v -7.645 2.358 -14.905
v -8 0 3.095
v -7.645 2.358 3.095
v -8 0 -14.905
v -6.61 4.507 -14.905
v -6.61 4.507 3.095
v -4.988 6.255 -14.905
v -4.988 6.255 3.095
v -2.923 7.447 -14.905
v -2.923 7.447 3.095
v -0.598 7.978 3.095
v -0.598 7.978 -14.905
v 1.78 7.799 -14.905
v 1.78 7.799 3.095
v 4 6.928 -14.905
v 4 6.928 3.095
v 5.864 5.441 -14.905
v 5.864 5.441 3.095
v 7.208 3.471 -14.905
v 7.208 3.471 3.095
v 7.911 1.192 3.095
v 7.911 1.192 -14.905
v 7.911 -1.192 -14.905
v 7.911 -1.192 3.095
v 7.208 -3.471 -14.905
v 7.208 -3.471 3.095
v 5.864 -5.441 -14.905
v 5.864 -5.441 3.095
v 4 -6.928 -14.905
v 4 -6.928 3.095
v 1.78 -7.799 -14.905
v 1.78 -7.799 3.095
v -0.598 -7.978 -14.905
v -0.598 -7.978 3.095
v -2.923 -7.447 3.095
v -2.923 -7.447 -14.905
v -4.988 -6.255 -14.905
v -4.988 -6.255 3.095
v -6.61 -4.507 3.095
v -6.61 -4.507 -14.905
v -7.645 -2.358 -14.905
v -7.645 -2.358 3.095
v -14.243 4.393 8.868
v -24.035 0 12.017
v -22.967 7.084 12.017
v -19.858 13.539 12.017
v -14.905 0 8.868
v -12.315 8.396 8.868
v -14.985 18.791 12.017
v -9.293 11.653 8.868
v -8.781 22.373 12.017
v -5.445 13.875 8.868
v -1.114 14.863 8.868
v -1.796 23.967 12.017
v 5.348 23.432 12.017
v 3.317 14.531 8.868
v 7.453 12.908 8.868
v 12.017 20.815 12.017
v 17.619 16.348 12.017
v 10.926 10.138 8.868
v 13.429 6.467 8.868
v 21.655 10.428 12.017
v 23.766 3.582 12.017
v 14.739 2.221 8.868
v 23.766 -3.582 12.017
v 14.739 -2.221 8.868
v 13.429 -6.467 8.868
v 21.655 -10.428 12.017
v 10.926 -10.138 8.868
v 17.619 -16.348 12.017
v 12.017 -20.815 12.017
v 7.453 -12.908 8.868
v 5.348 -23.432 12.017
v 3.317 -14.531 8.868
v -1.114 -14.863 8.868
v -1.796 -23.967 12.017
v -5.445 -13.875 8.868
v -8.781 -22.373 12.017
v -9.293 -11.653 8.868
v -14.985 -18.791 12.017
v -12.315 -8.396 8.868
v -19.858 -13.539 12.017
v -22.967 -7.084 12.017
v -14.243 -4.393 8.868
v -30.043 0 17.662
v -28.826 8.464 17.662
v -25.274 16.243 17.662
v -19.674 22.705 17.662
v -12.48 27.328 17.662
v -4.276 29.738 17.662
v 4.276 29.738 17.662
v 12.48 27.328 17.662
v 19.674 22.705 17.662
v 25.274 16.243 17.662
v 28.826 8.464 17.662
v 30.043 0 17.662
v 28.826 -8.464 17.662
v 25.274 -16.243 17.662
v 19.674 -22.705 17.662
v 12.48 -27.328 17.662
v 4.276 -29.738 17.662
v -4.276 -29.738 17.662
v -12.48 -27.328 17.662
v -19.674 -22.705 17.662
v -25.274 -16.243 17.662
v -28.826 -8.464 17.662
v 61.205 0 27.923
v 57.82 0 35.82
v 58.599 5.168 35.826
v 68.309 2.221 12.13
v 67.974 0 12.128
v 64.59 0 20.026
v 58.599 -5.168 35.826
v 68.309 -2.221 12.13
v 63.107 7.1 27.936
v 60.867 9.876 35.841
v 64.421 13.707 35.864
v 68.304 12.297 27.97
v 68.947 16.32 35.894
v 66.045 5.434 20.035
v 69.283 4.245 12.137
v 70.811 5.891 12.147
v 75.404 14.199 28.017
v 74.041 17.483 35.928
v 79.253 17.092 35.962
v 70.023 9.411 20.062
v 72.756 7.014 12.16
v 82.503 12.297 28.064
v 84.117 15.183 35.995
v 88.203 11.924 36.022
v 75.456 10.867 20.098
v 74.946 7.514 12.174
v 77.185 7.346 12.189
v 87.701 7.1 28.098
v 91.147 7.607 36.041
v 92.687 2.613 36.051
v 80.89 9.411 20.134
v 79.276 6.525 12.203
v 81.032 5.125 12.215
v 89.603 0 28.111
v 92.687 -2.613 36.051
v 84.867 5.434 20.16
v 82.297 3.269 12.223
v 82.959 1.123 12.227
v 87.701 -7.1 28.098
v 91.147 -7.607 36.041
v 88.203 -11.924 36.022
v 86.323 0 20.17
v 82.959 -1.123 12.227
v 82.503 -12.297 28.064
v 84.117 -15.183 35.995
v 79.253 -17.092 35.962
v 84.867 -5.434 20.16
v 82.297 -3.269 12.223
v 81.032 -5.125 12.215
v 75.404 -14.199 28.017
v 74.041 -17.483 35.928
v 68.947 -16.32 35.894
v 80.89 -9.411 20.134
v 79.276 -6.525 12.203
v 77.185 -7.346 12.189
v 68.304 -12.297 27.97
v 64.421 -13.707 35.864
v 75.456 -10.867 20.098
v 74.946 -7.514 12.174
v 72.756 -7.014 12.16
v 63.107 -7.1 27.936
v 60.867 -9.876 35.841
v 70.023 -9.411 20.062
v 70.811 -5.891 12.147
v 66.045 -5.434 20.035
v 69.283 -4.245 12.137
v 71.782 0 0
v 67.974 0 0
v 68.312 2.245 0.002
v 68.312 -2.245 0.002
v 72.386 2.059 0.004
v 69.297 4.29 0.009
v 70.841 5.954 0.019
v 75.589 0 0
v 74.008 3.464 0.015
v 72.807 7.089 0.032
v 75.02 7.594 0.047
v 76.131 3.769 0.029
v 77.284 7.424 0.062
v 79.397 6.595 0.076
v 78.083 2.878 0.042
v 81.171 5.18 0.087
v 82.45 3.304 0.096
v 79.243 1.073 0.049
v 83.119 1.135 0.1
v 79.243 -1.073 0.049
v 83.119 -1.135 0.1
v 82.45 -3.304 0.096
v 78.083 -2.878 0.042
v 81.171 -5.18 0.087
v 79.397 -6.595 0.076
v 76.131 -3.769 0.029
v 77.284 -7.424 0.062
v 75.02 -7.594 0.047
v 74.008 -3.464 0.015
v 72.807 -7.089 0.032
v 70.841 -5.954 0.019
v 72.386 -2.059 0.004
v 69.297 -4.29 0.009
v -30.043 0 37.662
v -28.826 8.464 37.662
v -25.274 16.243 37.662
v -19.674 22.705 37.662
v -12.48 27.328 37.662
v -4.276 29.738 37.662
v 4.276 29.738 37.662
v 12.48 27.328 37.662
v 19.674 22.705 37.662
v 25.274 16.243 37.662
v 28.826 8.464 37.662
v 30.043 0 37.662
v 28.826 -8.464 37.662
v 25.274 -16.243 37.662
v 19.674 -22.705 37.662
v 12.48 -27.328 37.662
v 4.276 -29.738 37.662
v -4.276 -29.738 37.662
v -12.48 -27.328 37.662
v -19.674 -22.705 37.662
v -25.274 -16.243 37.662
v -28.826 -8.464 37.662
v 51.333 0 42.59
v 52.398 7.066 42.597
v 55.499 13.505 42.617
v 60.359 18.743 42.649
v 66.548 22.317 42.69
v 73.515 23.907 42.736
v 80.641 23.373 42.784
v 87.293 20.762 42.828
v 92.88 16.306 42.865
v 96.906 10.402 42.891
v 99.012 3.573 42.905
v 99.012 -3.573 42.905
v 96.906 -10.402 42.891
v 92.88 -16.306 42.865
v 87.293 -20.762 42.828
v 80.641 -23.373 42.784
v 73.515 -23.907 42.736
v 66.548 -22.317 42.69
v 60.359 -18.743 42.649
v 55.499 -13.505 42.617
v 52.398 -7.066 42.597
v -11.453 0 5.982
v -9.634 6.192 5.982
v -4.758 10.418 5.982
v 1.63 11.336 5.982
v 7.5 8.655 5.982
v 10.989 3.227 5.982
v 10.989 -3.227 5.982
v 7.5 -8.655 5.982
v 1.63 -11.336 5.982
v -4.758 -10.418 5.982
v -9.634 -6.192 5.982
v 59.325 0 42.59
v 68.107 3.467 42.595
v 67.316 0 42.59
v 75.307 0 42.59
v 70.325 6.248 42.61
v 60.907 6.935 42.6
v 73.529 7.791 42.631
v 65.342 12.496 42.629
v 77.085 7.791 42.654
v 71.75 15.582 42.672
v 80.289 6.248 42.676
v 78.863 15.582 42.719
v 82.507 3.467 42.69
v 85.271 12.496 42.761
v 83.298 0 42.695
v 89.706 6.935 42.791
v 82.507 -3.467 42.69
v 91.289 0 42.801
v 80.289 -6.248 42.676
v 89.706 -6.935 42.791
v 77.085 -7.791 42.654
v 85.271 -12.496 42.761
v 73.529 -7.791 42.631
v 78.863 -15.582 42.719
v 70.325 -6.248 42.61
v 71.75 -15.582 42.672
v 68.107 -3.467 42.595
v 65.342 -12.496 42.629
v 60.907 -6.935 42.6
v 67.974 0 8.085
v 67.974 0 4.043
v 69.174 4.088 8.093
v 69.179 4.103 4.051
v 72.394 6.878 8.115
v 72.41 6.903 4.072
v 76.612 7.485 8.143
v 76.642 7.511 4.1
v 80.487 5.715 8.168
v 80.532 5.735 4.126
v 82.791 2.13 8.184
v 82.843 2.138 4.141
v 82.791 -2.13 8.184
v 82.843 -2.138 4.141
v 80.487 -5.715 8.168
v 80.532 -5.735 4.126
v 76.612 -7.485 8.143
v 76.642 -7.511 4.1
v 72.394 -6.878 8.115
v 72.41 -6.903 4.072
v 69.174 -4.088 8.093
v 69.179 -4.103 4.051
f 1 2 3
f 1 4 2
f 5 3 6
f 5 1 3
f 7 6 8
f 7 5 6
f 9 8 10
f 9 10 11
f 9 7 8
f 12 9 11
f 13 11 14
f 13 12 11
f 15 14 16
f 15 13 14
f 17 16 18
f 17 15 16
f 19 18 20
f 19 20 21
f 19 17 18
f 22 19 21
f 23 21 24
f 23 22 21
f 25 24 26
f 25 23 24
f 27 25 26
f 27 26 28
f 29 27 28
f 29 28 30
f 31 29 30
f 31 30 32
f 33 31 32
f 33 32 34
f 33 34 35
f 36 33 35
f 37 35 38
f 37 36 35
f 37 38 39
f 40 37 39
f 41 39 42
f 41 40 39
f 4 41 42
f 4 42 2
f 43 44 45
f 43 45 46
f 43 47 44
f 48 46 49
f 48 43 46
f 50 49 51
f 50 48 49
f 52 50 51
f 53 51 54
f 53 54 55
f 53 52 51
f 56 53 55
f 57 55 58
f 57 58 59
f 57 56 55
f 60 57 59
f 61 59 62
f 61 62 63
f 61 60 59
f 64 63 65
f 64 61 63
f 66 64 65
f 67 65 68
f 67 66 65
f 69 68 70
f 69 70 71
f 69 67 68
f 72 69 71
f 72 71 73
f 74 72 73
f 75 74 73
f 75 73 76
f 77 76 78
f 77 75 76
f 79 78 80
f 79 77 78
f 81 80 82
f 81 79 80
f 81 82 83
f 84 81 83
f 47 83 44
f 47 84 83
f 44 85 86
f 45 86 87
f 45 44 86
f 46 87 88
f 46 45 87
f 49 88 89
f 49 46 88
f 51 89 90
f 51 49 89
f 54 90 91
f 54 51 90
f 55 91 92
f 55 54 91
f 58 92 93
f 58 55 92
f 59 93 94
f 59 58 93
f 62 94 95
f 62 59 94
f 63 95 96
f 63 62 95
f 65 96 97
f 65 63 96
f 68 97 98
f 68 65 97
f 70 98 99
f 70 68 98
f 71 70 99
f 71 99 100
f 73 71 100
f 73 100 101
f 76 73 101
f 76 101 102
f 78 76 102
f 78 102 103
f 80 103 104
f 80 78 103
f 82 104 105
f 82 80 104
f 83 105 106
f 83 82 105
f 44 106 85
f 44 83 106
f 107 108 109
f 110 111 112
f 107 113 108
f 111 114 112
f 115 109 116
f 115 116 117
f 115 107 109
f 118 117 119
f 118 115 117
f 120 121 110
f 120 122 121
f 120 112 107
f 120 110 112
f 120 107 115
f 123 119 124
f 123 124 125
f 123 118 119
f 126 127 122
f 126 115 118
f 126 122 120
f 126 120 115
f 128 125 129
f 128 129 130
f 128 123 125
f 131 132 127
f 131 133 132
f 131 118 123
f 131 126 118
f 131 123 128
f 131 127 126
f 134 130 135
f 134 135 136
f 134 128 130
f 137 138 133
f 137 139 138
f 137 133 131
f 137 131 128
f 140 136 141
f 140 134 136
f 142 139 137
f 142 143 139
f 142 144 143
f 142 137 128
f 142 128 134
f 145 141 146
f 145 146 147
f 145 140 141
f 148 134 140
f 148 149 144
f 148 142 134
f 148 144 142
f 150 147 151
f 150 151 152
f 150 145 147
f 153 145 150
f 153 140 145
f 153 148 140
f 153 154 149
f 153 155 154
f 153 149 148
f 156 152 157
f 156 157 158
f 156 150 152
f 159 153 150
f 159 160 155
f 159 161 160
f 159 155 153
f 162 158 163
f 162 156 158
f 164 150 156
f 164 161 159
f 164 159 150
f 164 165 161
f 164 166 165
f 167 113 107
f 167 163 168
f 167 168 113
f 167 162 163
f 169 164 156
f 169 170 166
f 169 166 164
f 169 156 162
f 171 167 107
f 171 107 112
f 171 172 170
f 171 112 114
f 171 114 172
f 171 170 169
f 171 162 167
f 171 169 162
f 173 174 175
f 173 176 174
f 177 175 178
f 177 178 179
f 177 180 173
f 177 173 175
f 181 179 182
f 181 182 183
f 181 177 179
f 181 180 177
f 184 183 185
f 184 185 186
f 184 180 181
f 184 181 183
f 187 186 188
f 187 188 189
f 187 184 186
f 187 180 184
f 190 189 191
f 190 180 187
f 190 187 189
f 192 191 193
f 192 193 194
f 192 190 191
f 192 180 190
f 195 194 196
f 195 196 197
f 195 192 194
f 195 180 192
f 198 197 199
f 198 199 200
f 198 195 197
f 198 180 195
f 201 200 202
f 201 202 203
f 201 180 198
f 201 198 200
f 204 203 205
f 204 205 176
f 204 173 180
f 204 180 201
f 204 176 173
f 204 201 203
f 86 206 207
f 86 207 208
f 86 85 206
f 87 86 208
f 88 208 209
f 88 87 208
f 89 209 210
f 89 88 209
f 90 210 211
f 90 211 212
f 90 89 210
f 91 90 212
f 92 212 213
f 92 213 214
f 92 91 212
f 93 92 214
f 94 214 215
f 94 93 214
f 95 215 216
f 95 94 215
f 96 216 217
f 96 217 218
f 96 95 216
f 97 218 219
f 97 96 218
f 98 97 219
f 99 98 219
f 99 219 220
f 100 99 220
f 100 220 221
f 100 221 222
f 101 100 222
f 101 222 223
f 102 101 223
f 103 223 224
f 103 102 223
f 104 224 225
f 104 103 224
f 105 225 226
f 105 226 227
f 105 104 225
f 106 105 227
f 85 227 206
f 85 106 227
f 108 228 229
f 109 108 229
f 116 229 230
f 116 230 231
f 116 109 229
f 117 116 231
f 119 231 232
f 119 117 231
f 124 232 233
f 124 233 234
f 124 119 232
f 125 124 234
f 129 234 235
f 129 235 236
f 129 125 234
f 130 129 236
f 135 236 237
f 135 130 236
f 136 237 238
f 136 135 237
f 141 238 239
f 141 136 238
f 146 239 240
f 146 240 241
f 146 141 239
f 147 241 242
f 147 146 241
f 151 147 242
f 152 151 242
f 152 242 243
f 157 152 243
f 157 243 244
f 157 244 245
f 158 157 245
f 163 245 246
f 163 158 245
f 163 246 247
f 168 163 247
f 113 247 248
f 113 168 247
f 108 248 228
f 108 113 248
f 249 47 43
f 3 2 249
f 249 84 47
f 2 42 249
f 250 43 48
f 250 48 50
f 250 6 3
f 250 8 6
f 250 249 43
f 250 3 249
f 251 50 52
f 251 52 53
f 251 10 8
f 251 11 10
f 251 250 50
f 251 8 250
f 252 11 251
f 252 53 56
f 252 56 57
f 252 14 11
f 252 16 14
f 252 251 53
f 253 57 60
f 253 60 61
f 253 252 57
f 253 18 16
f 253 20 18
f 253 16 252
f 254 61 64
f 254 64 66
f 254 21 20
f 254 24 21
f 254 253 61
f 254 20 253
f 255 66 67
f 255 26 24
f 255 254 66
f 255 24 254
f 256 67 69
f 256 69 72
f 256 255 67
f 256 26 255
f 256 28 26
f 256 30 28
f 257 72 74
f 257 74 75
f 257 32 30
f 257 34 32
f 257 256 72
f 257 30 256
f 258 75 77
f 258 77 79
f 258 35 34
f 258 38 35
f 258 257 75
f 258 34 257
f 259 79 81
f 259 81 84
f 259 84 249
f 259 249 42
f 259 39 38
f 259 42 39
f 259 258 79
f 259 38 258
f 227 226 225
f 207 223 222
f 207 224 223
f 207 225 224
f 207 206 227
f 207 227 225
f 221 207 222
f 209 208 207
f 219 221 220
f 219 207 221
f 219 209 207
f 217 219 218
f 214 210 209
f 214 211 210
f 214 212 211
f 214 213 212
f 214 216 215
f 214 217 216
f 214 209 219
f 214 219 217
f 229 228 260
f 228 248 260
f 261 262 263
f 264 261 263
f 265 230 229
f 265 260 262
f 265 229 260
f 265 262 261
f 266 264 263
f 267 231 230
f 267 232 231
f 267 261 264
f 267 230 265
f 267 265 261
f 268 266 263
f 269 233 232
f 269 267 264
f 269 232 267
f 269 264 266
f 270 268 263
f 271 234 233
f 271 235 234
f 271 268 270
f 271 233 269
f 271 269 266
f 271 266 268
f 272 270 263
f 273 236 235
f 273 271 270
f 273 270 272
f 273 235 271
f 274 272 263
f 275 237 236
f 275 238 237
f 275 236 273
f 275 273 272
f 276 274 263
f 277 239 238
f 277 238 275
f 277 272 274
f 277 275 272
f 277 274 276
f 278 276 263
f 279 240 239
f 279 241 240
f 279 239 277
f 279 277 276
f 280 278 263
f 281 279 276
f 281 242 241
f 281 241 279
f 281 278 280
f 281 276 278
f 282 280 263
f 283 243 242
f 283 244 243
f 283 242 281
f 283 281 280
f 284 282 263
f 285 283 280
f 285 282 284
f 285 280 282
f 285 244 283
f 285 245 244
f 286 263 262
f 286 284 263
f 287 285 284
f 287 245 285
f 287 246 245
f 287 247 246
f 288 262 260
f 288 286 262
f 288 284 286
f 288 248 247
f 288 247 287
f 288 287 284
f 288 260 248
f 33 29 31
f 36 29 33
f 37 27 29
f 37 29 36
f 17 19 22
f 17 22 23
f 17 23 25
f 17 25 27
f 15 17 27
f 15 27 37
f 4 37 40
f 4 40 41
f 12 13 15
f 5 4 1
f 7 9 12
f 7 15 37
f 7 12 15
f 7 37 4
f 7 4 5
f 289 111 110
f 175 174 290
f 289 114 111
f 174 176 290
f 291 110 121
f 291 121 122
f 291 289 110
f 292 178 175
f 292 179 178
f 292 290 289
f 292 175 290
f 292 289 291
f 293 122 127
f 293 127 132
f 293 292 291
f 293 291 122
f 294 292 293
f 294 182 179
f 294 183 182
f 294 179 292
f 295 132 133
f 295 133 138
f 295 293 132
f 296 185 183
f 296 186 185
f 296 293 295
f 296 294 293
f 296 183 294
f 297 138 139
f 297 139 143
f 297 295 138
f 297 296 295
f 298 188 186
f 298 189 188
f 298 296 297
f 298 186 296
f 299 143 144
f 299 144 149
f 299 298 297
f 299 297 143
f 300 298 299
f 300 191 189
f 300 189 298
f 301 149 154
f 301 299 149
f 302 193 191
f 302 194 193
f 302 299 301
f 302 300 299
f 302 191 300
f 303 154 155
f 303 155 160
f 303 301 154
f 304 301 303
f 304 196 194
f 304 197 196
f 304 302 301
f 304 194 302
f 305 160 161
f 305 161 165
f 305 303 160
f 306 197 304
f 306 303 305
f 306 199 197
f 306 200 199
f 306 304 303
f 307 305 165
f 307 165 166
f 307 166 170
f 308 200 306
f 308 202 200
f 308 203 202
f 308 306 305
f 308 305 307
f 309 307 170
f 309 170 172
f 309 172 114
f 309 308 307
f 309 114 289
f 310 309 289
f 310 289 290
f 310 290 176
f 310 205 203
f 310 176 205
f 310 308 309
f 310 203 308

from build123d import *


with BuildPart() as f1:
    # F0 (on Front) → F1 (revolve)
    with BuildSketch(Plane.XZ):
        Polygon((0, -14.9046241604), (0, 37.6618508995), (-30.0433542579, 37.6618508995), (-30.0433542579, 17.6618508995), (-24.0346863866, 12.0173413306), (-14.9050139795, 8.8677914469), (-8, 3.0953758396), (-8, -14.9046241604), align=None)
    revolve(axis=Axis((0, 0, 11.3786133695), (0, 0, -1)))


with BuildPart() as f3:
    # F2 (on Front) → F3 (revolve)
    with BuildSketch(Plane.XZ):
        Polygon((67.9741203785, 0), (75.5894780159, 0), (75.3074288368, 42.589597404), (51.3331517577, 42.589597404), (57.8203089535, 35.8203873038), (67.9741203785, 12.1281621978), align=None)
    revolve(axis=Axis((75.4484534264, 0, 21.294798702), (0.0066223447, 0, -0.999978072)))


solid = Compound([f1.part, f3.part])
